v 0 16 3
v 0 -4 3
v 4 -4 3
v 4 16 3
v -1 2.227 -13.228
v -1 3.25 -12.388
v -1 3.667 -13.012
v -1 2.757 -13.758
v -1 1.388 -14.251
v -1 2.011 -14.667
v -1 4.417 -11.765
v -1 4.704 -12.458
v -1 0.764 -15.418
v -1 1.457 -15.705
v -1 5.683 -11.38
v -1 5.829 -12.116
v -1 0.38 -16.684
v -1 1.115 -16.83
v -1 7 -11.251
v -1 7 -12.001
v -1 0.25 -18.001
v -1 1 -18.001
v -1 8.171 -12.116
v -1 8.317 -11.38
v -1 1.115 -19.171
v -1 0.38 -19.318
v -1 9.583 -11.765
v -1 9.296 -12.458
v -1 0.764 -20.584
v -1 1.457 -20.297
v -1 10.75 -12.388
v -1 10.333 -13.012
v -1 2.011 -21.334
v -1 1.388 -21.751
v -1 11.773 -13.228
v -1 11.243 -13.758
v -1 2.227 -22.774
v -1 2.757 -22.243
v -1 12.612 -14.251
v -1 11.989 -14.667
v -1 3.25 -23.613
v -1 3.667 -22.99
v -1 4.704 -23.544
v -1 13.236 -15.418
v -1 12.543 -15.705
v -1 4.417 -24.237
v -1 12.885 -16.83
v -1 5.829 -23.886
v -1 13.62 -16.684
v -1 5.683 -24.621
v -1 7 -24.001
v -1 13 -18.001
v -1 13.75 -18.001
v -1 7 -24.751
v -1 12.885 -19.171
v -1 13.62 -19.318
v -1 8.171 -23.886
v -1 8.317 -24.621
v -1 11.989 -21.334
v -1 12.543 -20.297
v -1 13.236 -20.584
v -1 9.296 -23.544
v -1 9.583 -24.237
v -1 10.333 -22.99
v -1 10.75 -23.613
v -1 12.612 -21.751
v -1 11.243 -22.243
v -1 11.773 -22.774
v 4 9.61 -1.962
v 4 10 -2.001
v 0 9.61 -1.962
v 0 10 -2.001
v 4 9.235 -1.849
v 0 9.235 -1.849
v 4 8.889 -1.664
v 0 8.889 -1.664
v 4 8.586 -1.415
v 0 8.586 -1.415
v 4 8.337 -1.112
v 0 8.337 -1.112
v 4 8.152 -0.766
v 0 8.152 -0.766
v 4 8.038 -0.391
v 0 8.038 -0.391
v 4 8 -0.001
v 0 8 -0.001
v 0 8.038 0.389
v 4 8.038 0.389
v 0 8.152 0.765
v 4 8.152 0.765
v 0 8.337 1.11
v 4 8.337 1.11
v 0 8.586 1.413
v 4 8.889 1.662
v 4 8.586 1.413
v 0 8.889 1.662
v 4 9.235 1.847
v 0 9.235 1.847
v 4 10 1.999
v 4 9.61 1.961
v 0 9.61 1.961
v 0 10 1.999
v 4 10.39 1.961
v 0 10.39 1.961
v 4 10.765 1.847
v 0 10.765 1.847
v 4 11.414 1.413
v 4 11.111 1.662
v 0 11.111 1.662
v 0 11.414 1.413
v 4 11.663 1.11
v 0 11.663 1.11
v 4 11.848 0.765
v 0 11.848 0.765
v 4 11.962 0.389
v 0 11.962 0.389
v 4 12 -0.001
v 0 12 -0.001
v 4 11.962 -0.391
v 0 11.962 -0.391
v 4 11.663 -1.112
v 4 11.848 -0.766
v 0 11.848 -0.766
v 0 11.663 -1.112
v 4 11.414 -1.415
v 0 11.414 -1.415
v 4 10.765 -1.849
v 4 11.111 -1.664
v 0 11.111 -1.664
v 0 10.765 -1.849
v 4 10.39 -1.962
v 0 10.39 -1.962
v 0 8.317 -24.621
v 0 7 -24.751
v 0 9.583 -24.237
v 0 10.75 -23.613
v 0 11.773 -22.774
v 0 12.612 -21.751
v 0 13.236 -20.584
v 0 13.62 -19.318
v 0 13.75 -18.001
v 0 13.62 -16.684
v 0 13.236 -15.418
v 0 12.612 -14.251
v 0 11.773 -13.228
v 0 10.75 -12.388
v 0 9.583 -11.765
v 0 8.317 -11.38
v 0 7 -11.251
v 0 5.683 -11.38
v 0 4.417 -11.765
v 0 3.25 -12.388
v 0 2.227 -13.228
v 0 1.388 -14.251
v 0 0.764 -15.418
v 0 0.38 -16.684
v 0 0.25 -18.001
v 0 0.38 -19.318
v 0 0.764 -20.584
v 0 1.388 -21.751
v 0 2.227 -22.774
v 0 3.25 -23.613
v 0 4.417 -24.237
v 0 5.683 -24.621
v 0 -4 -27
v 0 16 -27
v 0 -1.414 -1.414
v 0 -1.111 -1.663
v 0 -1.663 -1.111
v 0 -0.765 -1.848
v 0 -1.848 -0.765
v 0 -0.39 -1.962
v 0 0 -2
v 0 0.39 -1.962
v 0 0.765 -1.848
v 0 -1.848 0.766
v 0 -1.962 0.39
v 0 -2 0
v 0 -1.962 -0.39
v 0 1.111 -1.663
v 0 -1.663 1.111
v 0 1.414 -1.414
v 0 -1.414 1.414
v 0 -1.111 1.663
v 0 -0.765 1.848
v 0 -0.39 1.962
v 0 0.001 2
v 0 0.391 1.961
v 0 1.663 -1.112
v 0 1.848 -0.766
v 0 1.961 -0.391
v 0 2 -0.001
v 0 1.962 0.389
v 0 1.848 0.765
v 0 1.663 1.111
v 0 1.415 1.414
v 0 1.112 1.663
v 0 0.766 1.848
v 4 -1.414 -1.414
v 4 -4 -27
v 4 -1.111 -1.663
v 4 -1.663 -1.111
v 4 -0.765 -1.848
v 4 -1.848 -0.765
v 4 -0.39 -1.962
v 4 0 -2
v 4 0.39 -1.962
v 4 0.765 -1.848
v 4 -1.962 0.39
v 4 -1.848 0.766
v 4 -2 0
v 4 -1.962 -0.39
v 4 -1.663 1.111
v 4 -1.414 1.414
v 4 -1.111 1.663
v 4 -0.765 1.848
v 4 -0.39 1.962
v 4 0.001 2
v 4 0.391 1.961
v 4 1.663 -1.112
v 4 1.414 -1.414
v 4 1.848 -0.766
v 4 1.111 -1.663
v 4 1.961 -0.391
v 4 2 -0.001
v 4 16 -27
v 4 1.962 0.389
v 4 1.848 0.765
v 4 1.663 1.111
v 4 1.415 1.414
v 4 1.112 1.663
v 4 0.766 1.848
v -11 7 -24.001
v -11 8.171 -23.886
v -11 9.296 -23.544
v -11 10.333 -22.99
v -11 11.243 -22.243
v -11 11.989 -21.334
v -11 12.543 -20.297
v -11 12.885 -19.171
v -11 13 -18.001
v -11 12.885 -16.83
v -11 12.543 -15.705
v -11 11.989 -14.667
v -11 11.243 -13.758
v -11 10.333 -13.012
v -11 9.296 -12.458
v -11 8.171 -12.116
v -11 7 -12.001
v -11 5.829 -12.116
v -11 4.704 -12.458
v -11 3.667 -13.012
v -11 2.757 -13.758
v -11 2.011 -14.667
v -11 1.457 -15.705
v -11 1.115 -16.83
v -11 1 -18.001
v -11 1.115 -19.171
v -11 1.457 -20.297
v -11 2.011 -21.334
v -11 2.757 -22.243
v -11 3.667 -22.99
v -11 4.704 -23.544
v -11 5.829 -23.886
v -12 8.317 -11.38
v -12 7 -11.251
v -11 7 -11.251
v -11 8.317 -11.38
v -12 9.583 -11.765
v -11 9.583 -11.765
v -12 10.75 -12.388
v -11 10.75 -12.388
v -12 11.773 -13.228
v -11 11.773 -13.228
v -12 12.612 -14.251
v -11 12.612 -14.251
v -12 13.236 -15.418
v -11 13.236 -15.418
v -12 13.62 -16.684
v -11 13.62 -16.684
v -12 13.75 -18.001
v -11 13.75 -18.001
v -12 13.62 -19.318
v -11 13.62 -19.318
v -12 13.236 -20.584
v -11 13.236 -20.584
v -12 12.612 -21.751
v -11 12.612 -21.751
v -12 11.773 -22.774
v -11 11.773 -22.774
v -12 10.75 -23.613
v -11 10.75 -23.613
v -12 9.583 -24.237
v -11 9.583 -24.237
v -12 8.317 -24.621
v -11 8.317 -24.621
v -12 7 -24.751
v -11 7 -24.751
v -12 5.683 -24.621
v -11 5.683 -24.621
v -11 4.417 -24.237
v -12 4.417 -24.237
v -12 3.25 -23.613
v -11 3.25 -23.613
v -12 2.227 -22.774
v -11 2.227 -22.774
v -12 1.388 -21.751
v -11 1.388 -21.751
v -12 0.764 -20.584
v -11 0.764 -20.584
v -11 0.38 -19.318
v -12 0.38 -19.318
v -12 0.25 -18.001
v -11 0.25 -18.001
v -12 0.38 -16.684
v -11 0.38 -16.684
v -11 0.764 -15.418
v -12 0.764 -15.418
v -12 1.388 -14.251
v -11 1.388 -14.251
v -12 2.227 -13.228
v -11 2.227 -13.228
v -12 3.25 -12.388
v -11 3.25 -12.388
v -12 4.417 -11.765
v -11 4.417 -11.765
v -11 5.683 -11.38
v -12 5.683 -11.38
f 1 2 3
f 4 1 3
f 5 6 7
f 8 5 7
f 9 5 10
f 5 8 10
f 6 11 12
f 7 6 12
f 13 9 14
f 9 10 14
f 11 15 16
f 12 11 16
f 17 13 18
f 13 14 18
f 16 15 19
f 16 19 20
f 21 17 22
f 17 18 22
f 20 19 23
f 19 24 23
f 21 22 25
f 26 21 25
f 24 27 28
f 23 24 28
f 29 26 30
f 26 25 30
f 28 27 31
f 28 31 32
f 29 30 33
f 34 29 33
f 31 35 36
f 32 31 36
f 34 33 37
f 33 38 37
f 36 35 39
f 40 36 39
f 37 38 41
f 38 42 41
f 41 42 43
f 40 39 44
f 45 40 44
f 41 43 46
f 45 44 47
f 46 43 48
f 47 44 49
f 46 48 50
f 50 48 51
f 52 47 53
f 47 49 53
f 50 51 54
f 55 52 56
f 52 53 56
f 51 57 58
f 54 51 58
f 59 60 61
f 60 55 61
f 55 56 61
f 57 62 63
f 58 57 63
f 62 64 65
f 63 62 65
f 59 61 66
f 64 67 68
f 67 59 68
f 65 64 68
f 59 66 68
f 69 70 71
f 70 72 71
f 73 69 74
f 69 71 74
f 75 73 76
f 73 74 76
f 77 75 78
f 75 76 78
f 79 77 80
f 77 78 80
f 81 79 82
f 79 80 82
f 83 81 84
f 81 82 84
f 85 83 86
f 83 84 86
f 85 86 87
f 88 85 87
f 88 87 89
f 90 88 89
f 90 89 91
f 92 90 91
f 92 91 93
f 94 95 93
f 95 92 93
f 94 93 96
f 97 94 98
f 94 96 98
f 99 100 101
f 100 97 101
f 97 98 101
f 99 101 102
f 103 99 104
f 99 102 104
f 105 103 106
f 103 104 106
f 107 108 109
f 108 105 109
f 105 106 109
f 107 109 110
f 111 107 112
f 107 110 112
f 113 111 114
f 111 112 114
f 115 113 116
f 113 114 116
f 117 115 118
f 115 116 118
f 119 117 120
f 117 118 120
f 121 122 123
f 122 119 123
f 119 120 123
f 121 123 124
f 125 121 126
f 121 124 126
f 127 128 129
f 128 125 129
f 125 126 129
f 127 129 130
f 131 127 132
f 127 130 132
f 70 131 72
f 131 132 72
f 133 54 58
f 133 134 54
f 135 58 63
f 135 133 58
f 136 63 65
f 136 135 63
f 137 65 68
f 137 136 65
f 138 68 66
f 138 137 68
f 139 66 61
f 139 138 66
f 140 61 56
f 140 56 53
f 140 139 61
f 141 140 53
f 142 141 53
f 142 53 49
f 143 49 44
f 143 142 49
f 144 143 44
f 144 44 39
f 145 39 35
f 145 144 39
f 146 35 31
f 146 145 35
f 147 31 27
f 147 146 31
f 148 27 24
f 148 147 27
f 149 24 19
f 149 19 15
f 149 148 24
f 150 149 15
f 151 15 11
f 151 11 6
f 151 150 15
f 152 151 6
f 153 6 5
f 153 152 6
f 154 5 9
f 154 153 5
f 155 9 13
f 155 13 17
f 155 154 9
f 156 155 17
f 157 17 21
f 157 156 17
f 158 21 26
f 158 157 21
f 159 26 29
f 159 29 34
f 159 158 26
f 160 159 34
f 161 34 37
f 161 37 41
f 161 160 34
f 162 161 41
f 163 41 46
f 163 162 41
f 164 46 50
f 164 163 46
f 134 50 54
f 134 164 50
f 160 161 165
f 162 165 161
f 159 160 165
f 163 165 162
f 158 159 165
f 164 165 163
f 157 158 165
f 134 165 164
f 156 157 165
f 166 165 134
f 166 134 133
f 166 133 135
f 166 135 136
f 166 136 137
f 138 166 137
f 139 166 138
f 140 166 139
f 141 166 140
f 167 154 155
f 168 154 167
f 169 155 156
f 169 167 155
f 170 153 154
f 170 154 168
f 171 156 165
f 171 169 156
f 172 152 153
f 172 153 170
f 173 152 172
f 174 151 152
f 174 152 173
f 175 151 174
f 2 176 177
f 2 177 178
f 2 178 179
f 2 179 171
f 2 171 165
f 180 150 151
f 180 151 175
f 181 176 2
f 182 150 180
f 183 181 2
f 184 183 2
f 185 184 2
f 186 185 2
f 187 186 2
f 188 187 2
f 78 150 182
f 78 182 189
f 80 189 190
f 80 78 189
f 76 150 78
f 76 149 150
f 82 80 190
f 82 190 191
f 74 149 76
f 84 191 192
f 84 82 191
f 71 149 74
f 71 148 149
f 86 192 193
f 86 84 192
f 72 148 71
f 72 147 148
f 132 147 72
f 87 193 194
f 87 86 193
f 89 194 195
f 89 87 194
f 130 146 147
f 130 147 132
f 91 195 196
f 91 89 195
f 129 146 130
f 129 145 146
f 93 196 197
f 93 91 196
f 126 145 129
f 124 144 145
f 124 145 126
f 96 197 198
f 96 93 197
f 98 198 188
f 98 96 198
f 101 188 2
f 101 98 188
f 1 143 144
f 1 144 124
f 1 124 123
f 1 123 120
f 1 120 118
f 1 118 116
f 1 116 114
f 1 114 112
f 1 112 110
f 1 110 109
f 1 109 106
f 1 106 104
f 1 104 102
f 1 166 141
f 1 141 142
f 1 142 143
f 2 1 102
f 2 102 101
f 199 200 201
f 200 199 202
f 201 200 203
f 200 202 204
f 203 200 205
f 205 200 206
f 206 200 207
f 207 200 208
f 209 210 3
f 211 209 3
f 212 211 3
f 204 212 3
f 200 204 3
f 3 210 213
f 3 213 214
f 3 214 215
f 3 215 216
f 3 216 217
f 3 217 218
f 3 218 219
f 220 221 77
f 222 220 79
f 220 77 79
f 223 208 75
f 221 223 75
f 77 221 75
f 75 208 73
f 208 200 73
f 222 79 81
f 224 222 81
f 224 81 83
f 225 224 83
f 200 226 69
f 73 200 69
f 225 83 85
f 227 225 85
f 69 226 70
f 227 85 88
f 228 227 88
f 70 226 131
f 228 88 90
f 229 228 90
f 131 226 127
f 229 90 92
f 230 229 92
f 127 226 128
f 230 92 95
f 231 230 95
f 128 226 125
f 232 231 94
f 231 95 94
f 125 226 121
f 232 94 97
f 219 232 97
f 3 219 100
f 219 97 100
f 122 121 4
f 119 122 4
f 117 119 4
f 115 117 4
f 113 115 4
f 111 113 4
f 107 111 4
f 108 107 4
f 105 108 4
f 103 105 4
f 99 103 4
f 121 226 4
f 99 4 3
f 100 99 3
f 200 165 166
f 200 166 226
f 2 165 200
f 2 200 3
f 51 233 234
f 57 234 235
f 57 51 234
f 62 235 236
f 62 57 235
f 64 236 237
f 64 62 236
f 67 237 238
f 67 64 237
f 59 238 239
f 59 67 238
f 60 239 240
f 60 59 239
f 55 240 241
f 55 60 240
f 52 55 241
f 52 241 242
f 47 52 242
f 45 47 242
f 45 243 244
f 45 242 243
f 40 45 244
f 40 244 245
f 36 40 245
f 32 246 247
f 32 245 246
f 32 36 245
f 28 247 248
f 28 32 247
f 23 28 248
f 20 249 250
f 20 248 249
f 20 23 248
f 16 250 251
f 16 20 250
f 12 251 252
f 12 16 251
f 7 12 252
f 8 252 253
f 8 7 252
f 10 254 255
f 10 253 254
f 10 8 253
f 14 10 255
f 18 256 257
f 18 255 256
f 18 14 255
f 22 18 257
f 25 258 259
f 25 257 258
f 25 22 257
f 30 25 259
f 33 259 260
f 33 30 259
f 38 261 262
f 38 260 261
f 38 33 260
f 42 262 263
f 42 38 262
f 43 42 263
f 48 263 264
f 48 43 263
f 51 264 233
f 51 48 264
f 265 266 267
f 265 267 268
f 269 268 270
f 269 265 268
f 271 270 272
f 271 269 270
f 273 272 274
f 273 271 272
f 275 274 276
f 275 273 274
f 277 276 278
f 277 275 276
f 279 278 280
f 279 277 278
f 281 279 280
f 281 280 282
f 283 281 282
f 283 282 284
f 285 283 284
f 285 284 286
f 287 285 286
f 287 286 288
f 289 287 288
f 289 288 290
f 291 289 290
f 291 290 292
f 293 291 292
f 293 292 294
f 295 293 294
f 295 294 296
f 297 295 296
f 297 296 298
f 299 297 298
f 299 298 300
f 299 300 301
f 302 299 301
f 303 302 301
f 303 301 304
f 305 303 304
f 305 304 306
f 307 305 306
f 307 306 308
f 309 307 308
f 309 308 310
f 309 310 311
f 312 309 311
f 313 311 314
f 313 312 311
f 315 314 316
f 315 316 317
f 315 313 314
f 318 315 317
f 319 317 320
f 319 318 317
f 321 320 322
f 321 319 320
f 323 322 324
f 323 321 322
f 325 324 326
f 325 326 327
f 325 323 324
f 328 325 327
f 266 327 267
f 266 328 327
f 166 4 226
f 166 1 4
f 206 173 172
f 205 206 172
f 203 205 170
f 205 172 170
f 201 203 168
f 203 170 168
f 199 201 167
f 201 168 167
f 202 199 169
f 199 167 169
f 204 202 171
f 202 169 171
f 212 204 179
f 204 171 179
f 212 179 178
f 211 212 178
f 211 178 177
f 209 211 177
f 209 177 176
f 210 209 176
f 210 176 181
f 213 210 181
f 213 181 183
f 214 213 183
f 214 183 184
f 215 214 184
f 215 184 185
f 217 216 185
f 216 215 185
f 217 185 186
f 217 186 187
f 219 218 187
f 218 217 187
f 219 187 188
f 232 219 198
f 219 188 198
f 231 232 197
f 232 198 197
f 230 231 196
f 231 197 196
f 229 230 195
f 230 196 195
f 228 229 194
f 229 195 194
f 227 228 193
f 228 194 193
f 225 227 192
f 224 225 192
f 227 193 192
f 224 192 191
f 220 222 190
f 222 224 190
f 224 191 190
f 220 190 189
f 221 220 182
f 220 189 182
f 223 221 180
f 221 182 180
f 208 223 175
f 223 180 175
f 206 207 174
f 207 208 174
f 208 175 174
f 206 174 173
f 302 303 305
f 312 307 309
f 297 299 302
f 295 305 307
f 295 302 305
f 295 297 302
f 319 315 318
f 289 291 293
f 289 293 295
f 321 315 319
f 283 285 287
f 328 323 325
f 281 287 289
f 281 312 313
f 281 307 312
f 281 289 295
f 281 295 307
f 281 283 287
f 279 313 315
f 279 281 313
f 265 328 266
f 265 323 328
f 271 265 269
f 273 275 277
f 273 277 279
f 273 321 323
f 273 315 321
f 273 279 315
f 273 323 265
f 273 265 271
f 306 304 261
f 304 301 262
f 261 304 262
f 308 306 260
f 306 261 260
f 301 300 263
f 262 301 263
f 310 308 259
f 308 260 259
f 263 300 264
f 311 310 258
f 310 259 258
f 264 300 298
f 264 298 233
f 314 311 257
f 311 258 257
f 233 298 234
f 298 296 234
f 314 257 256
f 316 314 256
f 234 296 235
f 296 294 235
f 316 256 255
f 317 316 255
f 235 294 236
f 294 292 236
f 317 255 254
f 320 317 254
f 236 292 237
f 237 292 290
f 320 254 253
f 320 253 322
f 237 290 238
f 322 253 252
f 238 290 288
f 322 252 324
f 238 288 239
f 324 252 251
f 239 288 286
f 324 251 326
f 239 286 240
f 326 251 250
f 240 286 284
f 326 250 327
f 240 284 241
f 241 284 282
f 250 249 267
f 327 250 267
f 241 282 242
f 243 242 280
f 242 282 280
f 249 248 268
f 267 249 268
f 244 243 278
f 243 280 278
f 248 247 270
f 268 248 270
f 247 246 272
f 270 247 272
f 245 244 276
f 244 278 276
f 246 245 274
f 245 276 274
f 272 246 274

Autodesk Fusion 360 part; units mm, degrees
sketch "Sketch1" plane through (0, 0, 0) normal (1, 0, 0) x (0, 0, -1)
  circle A0 centre (0, 0) radius 2
  line L0 (0.0008, 2) -> (0.0008, 8)
  line L1 (0.0008, 8) -> (0.0008, 10)
  circle A1 centre (0.0008, 10) radius 2
  line L2 (-3, 15) -> (27, 15)
  line L3 (27, 15) -> (27, -3)
  line L4 (27, -3) -> (-3, -3)
  line L5 (-3, -3) -> (-3, 15)
  circle A2 centre (18.0008, 7) radius 6
  circle A3 centre (18.0008, 7) radius 6.75
  dimension "d1" = 4
  dimension "d2" = 6
  dimension "d3" = 2
  dimension "d4" = 4
  dimension "d6" = 30
  dimension "d7" = 18
  dimension "d33" = 12
  dimension "d34" = 13.5
  dimension "d42" = 10
  dimension "d43" = 3
extrude "Extrude1" add sketch "Sketch1" along normal blind 4 contours L2 L3 L4 L5 | A2 | A3
extrude "Extrude2" add 1 faces at (1.3333, 15, -7) along direction (0, 1, 0) blind 1
extrude "Extrude3" add 1 faces at (1.3333, -3, -17) along direction (0, -1, 0) blind 1
extrude "Extrude8" add sketch "Sketch1" against normal blind 12 contours A2
extrude "Extrude9" add sketch "Sketch1" against normal blind 1 contours A3
sketch "Sketch5" plane through (-12, 0, 0) normal (-1, 0, 0) x (0, 0, 1)
  circle A0 centre (-18.0008, 7) radius 6
  circle A1 centre (-18.0008, 7) radius 6.75
  dimension "d39" = 13.5
extrude "Extrude10" add sketch "Sketch5" against normal blind 1
